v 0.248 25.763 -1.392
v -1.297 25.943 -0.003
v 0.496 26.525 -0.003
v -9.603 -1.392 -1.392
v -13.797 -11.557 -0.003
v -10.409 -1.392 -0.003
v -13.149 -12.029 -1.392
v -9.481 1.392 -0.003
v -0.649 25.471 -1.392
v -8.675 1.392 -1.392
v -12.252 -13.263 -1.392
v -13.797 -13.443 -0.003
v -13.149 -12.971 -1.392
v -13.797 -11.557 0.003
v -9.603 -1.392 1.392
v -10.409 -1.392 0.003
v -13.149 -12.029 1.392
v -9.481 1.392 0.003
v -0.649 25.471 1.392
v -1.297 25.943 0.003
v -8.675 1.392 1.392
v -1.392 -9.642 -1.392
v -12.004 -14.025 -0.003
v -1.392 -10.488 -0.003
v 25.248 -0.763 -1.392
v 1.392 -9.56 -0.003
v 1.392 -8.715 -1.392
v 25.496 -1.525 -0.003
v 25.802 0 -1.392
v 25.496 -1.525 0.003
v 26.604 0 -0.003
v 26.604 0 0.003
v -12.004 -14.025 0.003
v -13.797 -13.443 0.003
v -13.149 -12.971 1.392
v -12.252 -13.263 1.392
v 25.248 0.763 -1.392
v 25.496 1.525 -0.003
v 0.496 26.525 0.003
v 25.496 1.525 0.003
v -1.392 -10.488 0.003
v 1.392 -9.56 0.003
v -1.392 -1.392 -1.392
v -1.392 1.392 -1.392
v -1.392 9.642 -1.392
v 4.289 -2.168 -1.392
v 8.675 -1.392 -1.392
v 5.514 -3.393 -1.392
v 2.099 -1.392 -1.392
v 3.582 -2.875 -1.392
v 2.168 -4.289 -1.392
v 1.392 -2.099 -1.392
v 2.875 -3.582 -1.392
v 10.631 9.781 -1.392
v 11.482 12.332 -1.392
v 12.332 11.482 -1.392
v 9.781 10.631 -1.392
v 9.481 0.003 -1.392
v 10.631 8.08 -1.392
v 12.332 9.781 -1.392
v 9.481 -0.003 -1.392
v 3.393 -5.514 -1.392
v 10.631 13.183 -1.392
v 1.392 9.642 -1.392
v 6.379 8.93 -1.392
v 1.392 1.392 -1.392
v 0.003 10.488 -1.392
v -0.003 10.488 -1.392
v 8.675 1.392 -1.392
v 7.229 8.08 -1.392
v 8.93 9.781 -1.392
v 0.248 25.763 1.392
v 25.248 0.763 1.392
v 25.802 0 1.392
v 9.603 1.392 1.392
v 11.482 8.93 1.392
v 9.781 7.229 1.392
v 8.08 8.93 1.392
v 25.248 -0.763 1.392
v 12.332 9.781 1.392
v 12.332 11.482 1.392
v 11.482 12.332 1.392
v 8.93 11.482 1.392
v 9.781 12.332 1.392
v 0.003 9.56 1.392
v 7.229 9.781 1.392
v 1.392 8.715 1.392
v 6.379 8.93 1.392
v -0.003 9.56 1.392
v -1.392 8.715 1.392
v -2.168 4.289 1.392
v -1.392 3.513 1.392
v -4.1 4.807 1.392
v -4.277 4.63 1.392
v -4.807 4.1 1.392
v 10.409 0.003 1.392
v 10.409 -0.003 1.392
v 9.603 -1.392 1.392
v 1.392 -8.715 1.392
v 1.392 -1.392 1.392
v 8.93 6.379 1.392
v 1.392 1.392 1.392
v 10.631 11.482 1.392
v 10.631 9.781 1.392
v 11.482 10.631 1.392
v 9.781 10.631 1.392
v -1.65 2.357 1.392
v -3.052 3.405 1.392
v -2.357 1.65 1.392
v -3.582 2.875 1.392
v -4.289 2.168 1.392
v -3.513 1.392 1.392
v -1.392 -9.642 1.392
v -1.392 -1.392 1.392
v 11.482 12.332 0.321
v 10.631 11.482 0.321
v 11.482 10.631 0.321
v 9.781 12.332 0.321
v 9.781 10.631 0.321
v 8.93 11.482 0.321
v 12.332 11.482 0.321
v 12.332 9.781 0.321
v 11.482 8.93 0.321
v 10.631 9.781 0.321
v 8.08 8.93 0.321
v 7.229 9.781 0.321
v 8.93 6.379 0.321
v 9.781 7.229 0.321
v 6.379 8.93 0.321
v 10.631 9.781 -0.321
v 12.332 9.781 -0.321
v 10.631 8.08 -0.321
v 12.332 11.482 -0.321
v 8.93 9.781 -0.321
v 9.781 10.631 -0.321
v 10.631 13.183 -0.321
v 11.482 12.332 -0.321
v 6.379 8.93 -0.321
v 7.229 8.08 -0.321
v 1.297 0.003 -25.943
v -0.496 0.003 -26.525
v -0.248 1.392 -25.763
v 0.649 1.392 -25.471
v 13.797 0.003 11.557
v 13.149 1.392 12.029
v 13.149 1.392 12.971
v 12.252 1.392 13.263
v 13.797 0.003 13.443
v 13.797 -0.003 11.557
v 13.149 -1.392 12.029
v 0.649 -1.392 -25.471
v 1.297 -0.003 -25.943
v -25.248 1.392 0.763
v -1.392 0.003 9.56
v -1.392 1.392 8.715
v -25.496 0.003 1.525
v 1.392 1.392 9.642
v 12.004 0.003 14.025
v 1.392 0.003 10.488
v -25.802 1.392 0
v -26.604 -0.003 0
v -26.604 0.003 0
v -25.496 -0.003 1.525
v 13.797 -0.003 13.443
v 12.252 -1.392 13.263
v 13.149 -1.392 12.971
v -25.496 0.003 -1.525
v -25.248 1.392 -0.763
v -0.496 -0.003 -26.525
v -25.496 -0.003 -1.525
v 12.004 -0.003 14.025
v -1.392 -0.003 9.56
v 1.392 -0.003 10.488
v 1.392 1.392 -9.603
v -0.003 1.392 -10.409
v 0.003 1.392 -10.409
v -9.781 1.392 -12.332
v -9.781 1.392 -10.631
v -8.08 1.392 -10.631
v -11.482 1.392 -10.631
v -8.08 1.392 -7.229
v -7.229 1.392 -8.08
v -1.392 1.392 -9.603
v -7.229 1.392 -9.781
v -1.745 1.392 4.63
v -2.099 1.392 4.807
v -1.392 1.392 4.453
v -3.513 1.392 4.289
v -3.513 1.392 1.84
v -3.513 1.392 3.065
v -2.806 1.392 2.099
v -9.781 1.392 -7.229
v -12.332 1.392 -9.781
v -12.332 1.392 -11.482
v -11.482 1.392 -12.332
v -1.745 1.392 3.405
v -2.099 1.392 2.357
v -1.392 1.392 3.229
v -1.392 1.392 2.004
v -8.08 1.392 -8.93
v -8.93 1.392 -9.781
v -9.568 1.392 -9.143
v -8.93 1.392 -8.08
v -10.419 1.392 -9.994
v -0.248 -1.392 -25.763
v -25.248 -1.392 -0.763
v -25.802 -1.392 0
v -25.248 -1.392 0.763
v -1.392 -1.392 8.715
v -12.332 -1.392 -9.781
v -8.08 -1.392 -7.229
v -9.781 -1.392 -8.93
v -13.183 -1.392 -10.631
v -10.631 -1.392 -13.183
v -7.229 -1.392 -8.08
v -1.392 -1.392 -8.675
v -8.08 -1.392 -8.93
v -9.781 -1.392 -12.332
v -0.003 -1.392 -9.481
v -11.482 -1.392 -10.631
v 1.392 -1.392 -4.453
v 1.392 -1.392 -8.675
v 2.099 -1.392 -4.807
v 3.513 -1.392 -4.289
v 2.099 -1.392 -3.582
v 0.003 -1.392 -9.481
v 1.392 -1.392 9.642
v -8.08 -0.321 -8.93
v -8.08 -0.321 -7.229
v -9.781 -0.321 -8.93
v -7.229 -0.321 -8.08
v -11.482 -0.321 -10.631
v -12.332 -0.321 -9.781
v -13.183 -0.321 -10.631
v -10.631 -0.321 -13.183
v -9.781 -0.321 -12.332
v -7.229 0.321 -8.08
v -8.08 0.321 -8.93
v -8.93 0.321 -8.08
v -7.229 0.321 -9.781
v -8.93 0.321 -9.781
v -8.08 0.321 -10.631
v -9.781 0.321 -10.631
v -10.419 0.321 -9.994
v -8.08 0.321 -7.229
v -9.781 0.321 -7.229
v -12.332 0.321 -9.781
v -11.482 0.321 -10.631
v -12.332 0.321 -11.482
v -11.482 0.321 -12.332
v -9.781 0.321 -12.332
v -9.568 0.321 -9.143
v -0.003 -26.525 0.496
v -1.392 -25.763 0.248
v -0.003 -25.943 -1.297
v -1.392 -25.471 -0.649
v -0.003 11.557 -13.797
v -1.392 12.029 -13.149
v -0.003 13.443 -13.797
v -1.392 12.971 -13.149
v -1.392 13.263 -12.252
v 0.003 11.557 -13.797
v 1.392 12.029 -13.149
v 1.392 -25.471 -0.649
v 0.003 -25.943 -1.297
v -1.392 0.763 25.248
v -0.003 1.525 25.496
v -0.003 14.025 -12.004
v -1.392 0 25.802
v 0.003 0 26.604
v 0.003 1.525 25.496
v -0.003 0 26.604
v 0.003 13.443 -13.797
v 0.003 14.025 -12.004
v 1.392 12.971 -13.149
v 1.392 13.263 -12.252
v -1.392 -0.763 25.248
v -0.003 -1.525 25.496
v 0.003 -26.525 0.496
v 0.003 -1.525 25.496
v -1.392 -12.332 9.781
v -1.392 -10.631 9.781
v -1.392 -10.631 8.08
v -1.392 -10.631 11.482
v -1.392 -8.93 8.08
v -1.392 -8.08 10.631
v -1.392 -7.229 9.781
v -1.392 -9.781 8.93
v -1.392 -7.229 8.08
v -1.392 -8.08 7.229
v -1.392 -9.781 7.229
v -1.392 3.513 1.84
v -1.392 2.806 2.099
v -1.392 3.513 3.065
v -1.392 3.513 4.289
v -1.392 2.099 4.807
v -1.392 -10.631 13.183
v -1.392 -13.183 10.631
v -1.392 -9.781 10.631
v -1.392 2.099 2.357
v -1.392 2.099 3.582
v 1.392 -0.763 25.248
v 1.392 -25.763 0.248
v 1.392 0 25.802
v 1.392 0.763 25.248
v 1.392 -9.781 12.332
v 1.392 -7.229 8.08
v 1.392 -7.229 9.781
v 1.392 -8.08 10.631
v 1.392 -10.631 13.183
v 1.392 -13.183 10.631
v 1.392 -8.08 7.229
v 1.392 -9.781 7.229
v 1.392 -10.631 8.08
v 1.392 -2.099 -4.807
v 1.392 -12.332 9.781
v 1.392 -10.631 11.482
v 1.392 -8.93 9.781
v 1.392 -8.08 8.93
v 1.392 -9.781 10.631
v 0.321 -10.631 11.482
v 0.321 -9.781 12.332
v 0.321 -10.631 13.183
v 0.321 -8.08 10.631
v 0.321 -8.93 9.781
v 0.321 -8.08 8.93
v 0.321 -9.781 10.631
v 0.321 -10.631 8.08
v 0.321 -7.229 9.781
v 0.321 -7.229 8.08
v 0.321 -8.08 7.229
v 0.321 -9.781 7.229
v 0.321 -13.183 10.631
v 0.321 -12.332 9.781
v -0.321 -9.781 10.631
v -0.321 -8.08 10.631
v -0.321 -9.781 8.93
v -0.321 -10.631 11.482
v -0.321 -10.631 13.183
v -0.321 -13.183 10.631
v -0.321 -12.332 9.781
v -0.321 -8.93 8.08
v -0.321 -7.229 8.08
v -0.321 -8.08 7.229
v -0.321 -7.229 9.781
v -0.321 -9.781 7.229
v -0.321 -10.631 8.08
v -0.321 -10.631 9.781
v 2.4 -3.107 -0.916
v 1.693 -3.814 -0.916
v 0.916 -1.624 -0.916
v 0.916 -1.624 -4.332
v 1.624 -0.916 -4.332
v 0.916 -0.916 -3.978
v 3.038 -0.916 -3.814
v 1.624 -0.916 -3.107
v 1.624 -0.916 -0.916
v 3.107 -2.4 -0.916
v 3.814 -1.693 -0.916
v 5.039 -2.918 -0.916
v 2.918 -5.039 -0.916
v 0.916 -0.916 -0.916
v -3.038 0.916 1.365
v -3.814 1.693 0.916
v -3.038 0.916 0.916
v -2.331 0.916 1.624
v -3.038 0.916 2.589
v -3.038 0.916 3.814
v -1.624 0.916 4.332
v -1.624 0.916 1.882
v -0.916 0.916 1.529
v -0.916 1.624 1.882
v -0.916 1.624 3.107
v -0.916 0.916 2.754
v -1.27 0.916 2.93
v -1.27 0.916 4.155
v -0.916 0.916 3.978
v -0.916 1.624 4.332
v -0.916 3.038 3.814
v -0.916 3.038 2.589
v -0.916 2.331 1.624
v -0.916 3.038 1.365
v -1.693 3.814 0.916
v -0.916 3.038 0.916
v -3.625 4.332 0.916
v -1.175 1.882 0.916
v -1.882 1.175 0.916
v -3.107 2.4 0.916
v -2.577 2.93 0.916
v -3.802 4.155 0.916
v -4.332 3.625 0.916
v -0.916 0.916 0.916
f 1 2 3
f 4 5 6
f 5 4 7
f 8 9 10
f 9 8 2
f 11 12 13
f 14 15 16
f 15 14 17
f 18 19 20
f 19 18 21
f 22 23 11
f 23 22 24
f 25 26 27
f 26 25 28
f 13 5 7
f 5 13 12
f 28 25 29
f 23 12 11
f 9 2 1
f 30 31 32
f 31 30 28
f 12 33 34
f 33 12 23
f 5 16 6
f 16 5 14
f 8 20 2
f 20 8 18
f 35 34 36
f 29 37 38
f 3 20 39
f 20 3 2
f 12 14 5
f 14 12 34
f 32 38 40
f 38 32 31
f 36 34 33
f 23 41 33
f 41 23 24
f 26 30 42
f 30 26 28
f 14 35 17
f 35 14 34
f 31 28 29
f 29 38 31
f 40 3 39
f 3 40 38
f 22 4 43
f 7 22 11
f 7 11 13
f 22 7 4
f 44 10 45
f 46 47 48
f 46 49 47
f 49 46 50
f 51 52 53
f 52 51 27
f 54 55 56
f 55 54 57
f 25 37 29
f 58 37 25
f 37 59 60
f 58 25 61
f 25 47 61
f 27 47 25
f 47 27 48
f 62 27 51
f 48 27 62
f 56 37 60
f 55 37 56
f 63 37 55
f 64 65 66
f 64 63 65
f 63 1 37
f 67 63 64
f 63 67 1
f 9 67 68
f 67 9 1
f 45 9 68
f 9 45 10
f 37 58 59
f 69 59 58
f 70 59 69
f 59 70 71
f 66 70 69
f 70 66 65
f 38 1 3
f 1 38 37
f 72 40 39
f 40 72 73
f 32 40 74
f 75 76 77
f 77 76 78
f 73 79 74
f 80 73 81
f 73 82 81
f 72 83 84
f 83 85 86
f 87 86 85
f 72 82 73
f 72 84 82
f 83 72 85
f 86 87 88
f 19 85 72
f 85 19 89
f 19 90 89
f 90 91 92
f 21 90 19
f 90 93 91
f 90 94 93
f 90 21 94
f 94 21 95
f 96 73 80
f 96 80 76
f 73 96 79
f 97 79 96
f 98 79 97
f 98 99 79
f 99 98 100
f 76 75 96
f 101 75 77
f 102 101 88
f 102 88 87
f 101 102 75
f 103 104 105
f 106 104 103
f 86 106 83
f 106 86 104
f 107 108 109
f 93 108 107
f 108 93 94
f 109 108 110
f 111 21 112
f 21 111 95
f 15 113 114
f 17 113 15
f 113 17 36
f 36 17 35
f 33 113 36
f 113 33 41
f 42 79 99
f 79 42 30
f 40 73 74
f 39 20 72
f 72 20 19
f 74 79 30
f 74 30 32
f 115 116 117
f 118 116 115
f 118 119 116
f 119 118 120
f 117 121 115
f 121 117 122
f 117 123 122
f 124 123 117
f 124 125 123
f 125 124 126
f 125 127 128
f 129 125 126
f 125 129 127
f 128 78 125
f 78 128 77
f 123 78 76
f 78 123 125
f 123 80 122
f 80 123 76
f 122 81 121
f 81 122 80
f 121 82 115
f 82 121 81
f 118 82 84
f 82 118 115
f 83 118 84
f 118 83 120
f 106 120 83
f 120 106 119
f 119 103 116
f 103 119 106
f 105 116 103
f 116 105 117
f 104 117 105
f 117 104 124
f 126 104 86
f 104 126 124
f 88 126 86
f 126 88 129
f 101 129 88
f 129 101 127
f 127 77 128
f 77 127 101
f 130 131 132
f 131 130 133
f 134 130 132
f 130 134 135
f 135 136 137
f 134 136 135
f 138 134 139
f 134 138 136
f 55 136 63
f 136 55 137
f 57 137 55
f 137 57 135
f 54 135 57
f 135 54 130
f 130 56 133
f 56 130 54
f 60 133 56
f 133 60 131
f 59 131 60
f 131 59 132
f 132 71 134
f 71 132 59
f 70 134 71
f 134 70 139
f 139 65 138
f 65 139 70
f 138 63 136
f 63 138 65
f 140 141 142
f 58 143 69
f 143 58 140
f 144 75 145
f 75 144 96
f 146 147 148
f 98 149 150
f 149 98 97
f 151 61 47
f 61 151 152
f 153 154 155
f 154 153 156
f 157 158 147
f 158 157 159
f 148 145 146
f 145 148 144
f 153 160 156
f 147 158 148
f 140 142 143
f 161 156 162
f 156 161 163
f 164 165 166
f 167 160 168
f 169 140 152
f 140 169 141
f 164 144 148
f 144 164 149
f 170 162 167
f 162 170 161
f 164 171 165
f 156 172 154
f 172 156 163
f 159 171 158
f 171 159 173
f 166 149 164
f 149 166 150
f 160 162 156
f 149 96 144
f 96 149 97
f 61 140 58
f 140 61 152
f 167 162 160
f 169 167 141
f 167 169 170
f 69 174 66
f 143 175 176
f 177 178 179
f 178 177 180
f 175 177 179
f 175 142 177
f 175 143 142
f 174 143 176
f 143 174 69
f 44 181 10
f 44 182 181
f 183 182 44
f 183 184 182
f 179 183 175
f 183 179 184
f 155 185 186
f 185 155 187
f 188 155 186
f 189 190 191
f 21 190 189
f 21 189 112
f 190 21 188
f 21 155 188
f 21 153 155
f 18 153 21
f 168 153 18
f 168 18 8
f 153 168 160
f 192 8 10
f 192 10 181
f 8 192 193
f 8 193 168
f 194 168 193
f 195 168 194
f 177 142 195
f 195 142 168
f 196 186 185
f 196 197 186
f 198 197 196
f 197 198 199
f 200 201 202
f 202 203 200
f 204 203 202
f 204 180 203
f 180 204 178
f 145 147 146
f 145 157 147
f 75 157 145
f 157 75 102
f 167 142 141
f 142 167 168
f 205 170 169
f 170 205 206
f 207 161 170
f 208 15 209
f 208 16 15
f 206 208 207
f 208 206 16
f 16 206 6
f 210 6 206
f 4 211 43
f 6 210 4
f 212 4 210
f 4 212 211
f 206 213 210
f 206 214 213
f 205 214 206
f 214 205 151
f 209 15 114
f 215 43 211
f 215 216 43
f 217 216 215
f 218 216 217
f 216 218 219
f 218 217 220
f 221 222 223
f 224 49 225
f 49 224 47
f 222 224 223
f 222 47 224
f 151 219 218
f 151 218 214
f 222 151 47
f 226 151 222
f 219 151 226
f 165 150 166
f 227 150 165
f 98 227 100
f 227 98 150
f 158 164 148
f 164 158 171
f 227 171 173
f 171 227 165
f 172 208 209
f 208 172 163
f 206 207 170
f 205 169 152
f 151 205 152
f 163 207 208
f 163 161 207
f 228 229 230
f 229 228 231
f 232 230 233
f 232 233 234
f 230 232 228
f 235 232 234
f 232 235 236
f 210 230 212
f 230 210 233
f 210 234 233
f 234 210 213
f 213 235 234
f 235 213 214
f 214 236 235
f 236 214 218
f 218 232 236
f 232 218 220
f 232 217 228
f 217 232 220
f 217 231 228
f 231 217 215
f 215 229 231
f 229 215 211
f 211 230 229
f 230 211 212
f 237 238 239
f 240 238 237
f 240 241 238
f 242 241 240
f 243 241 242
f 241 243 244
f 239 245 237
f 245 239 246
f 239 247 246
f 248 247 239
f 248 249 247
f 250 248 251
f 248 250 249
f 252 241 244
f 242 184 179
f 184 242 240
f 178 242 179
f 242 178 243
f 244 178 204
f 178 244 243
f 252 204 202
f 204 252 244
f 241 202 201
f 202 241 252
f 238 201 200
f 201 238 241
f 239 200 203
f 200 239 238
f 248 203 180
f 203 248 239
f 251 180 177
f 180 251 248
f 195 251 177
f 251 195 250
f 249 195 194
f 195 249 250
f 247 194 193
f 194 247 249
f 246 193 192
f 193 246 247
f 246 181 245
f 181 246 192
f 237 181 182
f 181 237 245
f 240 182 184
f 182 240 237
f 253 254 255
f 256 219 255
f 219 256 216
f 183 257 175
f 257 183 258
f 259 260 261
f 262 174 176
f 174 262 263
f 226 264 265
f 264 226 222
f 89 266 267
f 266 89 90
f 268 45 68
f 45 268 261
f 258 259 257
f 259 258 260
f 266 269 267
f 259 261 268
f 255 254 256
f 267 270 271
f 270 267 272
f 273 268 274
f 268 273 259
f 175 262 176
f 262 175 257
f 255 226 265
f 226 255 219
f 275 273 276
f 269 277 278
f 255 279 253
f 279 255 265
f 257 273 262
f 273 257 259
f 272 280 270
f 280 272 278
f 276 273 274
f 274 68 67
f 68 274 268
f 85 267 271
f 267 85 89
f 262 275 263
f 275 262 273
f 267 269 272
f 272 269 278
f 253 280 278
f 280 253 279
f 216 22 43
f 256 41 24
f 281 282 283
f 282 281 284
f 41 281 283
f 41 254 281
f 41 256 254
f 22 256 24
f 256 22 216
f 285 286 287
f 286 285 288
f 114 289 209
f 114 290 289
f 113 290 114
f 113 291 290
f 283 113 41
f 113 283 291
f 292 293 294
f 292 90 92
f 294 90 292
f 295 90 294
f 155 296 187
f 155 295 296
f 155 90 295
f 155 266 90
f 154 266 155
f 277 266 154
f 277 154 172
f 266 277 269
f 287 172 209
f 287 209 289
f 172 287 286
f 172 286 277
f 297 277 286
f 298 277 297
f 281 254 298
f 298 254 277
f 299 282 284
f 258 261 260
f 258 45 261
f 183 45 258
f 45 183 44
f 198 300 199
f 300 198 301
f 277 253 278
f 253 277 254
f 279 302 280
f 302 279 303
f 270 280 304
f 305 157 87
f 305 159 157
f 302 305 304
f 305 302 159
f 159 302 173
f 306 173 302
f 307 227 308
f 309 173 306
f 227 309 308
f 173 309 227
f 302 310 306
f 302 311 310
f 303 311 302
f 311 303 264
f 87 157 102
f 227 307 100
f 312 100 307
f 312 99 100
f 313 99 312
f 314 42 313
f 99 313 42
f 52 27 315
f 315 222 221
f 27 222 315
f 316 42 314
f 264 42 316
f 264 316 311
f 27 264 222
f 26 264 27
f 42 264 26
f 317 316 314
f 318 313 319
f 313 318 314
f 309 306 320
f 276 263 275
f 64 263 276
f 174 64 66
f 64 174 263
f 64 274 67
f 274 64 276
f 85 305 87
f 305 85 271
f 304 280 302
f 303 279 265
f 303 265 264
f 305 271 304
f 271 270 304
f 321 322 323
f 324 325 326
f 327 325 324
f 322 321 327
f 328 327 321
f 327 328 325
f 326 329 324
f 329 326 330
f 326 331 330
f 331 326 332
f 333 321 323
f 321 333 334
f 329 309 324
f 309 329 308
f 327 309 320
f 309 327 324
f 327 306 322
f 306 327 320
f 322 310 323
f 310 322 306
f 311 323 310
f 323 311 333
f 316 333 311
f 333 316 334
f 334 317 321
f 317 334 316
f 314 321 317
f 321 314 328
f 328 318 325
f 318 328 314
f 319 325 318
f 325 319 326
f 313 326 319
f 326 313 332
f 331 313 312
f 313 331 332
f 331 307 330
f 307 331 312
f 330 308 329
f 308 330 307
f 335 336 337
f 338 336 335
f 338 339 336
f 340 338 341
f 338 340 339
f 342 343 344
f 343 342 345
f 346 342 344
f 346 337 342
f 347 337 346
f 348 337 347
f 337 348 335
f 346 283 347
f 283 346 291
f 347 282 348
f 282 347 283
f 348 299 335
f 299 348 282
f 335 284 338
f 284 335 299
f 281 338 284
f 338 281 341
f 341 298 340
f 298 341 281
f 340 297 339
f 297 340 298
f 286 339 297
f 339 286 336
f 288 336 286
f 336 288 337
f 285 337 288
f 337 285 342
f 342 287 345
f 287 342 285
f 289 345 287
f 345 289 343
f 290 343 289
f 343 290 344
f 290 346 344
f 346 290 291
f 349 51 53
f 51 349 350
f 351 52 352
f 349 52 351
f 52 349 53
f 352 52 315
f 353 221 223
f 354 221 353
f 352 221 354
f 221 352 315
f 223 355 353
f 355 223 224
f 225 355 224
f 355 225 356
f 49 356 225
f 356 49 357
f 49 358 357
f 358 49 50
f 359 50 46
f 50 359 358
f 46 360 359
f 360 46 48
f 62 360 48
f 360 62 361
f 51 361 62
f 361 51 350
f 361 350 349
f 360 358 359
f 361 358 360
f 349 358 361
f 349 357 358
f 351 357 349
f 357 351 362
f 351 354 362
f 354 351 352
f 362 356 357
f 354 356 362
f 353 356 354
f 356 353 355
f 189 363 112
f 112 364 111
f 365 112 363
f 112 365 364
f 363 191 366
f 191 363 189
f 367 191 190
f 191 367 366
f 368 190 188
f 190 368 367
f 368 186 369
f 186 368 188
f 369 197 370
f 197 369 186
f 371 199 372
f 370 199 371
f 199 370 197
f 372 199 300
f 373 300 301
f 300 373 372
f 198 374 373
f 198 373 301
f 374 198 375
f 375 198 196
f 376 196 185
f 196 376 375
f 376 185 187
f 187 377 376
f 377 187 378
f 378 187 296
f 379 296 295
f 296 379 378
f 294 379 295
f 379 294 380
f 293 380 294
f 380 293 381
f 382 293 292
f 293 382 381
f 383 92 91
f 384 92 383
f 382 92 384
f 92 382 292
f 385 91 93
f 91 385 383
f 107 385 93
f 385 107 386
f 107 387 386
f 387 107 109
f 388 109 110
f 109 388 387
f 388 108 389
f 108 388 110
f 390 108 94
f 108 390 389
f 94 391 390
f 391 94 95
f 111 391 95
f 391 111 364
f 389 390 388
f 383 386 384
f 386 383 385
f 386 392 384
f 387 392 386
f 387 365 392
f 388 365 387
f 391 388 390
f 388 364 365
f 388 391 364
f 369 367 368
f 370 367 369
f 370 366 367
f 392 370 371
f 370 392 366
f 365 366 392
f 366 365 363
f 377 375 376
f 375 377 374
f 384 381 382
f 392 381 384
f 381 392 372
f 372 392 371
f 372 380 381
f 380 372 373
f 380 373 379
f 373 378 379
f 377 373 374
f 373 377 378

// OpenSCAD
diameter = 25*sqrt(3);
plane_thickness = diameter/27;
halfplane_emboss = plane_thickness / 5;
center_emboss = plane_thickness * 4/7;

module plane(){
	minkowski(){
 		linear_extrude(height=plane_thickness /300, center=true){
			child(0);
		}
		sphere(plane_thickness, $fn = 5);
	}
}

module halfplane(){
        translate([0,0,halfplane_emboss]){
	    linear_extrude(height=plane_thickness, center=false){
		child(0);
	    }
	}
}



module place(dir, dist=2/7){
f = diameter/36;
	rotate(dir){
	translate([0,diameter*dist,0]){
	halfplane(){
	scale([f,f,f]){
		translate([-1.5,0,0]){
			child(0);
		}
	}
	}
	}
	}
}


module corner(angle=[atan(sqrt(2)),0,45], doclip=true){
   rotate(angle){
     intersection(){
//     union(){
       linear_extrude(height=diameter){
	translate([-1.5,-2.5,0]){
		child(0);
	}
       }
       rotate([-atan(sqrt(2)),0,0]){
       rotate([0,0,-135]){
       translate([center_emboss, center_emboss, center_emboss]){
       cube(size = diameter/2);
       }
       }
       }
     }
   }
}

module center(planedir=0,numdir=0,clipdir=-135,front=true){
	f = diameter/36;
	r = front? 0 : 180;
	rotate([0,r,0]){
	halfplane(){
		scale([f,f,f]){ 
			rotate([0,0,-planedir]){
			intersection(){
			rotate([0,0,clipdir]){
				square([diameter,diameter],center=false);
			}
			scale([1,sqrt(3),1]){
			rotate([0,0,planedir]){
			rotate([0,0,numdir]){
			translate([-1.5,-2.5,0]){
				child(0);
			}
			}
			}
			}
			}
		}
	}
	}
	}
}

module oct_tri(){
	plane(){
		polygon(points=[[0,diameter/sqrt(3)],[diameter/sqrt(3),0],[-0.5 * diameter/sqrt(3), -0.5 * diameter/sqrt(3)]]);
	}
}


one = [
	[0,0],[0,1],[1,1],[1,4],[0,4],[1,5],[2,5],[2,1],[3,1],[3,0]
];
two = [
	[0,0],[0,1],[2,3],[2,4],[1,4],[1,3],[0,3],[0,4],[1,5],[2,5],[3,4],[3,3],[1,1],[3,1],[3,0]
];
three = [
	[0,1],[2,1],[2,2],[0,2],[2,4],[0,4],[0,5],[3,5],[3,4],[2,3],[3,2],[3,1],[2,0],[1,0]
];
four = [
	[3,0],[2,0],[2,2],[0,2],[0,4],[1,5],[1,3],[2,3],[2,5],[3,5]
];
five = [
	[0,1],[2,1],[2,2],[0,2],[0,4],[0,5],[3,5],[3,4],[1,4],[1,3],[2,3],[3,2],[3,1],[2,0],[1,0]
];
six = [
	[0,1],[0,4,],[1,5,],[2,5,],[3,4],[1,4],[1,1],[2,1],[2,2],[1.25,2],[1.25,3],[2,3],[3,2],[3,1],[2,0],[1,0]
];
seven = [
	[1,0],[1,1],[2,4],[0,4],[0,5],[3,5],[3,4],[2,2],[2,0]
];
eight = [
	[0,1],[0,2],[.5,2.5],[0,3],[0,4],[1,5],[1.75,5],[1.75,4],[1,4],[1,3],[2,3],[2,5],[3,4],[3,3],[2.5,2.5],[3,2],[3,1],[2,0],[1.25,0],[1.25,1],[2,1],[2,2],[1,2],[1,0]
];
target = [
	[1.495, 5],
	[1.25,4],
	[1.75,4],
	[1.505, 5],
	[1.5 + 1.25*sqrt(3),1.255],
	[3,1.75],
	[3,1.5],
	[2.5,1.5],
	[1.5 + 1.25*sqrt(3),1.245],
	[1.5 - 1.25*sqrt(3),1.245],
	[0.5,1.5],
	[0,1.5],
	[0.5,1.75],
	[0,1.65],
	[1.5 - 1.25*sqrt(3),1.255]
];

color("", 0.95){
 difference(){
// union(){
   union(){
	difference(){
	oct_tri();
	place([0,0,-45], 1/4){polygon(two);}
	place([0,180,-45], 1/4){polygon(four);}
	//center(45,135,-135,false){polygon(one);}
	//center(-45,-135,45,true){polygon(eight);}
	}
	rotate(a=[90,180,0]){
		difference(){
			oct_tri();
		place([0,0,-45], 1/4){polygon(seven);}
		place([0,180,-45], 1/4){polygon(six);}
		//center(135,165,-135,true){polygon(one);}
		//center(-135,-165,45,false){polygon(eight);}
		}
	}
	rotate(a=[90,-90,90]){
		difference(){
			oct_tri();
		place([0,0,-45], 1/4){polygon(three);}
		place([0,180,-45], 1/4){polygon(five);}
		//center(-45,-75,45){polygon(one);}
		//center(45,75,-135,false){polygon(eight);}
		}
	}
    }
     corner([atan(sqrt(2)),180,45]){
         polygon(one);
     }
     corner([atan(sqrt(2)),0,45 + 180]){
         polygon(eight);
     }

  }
}
